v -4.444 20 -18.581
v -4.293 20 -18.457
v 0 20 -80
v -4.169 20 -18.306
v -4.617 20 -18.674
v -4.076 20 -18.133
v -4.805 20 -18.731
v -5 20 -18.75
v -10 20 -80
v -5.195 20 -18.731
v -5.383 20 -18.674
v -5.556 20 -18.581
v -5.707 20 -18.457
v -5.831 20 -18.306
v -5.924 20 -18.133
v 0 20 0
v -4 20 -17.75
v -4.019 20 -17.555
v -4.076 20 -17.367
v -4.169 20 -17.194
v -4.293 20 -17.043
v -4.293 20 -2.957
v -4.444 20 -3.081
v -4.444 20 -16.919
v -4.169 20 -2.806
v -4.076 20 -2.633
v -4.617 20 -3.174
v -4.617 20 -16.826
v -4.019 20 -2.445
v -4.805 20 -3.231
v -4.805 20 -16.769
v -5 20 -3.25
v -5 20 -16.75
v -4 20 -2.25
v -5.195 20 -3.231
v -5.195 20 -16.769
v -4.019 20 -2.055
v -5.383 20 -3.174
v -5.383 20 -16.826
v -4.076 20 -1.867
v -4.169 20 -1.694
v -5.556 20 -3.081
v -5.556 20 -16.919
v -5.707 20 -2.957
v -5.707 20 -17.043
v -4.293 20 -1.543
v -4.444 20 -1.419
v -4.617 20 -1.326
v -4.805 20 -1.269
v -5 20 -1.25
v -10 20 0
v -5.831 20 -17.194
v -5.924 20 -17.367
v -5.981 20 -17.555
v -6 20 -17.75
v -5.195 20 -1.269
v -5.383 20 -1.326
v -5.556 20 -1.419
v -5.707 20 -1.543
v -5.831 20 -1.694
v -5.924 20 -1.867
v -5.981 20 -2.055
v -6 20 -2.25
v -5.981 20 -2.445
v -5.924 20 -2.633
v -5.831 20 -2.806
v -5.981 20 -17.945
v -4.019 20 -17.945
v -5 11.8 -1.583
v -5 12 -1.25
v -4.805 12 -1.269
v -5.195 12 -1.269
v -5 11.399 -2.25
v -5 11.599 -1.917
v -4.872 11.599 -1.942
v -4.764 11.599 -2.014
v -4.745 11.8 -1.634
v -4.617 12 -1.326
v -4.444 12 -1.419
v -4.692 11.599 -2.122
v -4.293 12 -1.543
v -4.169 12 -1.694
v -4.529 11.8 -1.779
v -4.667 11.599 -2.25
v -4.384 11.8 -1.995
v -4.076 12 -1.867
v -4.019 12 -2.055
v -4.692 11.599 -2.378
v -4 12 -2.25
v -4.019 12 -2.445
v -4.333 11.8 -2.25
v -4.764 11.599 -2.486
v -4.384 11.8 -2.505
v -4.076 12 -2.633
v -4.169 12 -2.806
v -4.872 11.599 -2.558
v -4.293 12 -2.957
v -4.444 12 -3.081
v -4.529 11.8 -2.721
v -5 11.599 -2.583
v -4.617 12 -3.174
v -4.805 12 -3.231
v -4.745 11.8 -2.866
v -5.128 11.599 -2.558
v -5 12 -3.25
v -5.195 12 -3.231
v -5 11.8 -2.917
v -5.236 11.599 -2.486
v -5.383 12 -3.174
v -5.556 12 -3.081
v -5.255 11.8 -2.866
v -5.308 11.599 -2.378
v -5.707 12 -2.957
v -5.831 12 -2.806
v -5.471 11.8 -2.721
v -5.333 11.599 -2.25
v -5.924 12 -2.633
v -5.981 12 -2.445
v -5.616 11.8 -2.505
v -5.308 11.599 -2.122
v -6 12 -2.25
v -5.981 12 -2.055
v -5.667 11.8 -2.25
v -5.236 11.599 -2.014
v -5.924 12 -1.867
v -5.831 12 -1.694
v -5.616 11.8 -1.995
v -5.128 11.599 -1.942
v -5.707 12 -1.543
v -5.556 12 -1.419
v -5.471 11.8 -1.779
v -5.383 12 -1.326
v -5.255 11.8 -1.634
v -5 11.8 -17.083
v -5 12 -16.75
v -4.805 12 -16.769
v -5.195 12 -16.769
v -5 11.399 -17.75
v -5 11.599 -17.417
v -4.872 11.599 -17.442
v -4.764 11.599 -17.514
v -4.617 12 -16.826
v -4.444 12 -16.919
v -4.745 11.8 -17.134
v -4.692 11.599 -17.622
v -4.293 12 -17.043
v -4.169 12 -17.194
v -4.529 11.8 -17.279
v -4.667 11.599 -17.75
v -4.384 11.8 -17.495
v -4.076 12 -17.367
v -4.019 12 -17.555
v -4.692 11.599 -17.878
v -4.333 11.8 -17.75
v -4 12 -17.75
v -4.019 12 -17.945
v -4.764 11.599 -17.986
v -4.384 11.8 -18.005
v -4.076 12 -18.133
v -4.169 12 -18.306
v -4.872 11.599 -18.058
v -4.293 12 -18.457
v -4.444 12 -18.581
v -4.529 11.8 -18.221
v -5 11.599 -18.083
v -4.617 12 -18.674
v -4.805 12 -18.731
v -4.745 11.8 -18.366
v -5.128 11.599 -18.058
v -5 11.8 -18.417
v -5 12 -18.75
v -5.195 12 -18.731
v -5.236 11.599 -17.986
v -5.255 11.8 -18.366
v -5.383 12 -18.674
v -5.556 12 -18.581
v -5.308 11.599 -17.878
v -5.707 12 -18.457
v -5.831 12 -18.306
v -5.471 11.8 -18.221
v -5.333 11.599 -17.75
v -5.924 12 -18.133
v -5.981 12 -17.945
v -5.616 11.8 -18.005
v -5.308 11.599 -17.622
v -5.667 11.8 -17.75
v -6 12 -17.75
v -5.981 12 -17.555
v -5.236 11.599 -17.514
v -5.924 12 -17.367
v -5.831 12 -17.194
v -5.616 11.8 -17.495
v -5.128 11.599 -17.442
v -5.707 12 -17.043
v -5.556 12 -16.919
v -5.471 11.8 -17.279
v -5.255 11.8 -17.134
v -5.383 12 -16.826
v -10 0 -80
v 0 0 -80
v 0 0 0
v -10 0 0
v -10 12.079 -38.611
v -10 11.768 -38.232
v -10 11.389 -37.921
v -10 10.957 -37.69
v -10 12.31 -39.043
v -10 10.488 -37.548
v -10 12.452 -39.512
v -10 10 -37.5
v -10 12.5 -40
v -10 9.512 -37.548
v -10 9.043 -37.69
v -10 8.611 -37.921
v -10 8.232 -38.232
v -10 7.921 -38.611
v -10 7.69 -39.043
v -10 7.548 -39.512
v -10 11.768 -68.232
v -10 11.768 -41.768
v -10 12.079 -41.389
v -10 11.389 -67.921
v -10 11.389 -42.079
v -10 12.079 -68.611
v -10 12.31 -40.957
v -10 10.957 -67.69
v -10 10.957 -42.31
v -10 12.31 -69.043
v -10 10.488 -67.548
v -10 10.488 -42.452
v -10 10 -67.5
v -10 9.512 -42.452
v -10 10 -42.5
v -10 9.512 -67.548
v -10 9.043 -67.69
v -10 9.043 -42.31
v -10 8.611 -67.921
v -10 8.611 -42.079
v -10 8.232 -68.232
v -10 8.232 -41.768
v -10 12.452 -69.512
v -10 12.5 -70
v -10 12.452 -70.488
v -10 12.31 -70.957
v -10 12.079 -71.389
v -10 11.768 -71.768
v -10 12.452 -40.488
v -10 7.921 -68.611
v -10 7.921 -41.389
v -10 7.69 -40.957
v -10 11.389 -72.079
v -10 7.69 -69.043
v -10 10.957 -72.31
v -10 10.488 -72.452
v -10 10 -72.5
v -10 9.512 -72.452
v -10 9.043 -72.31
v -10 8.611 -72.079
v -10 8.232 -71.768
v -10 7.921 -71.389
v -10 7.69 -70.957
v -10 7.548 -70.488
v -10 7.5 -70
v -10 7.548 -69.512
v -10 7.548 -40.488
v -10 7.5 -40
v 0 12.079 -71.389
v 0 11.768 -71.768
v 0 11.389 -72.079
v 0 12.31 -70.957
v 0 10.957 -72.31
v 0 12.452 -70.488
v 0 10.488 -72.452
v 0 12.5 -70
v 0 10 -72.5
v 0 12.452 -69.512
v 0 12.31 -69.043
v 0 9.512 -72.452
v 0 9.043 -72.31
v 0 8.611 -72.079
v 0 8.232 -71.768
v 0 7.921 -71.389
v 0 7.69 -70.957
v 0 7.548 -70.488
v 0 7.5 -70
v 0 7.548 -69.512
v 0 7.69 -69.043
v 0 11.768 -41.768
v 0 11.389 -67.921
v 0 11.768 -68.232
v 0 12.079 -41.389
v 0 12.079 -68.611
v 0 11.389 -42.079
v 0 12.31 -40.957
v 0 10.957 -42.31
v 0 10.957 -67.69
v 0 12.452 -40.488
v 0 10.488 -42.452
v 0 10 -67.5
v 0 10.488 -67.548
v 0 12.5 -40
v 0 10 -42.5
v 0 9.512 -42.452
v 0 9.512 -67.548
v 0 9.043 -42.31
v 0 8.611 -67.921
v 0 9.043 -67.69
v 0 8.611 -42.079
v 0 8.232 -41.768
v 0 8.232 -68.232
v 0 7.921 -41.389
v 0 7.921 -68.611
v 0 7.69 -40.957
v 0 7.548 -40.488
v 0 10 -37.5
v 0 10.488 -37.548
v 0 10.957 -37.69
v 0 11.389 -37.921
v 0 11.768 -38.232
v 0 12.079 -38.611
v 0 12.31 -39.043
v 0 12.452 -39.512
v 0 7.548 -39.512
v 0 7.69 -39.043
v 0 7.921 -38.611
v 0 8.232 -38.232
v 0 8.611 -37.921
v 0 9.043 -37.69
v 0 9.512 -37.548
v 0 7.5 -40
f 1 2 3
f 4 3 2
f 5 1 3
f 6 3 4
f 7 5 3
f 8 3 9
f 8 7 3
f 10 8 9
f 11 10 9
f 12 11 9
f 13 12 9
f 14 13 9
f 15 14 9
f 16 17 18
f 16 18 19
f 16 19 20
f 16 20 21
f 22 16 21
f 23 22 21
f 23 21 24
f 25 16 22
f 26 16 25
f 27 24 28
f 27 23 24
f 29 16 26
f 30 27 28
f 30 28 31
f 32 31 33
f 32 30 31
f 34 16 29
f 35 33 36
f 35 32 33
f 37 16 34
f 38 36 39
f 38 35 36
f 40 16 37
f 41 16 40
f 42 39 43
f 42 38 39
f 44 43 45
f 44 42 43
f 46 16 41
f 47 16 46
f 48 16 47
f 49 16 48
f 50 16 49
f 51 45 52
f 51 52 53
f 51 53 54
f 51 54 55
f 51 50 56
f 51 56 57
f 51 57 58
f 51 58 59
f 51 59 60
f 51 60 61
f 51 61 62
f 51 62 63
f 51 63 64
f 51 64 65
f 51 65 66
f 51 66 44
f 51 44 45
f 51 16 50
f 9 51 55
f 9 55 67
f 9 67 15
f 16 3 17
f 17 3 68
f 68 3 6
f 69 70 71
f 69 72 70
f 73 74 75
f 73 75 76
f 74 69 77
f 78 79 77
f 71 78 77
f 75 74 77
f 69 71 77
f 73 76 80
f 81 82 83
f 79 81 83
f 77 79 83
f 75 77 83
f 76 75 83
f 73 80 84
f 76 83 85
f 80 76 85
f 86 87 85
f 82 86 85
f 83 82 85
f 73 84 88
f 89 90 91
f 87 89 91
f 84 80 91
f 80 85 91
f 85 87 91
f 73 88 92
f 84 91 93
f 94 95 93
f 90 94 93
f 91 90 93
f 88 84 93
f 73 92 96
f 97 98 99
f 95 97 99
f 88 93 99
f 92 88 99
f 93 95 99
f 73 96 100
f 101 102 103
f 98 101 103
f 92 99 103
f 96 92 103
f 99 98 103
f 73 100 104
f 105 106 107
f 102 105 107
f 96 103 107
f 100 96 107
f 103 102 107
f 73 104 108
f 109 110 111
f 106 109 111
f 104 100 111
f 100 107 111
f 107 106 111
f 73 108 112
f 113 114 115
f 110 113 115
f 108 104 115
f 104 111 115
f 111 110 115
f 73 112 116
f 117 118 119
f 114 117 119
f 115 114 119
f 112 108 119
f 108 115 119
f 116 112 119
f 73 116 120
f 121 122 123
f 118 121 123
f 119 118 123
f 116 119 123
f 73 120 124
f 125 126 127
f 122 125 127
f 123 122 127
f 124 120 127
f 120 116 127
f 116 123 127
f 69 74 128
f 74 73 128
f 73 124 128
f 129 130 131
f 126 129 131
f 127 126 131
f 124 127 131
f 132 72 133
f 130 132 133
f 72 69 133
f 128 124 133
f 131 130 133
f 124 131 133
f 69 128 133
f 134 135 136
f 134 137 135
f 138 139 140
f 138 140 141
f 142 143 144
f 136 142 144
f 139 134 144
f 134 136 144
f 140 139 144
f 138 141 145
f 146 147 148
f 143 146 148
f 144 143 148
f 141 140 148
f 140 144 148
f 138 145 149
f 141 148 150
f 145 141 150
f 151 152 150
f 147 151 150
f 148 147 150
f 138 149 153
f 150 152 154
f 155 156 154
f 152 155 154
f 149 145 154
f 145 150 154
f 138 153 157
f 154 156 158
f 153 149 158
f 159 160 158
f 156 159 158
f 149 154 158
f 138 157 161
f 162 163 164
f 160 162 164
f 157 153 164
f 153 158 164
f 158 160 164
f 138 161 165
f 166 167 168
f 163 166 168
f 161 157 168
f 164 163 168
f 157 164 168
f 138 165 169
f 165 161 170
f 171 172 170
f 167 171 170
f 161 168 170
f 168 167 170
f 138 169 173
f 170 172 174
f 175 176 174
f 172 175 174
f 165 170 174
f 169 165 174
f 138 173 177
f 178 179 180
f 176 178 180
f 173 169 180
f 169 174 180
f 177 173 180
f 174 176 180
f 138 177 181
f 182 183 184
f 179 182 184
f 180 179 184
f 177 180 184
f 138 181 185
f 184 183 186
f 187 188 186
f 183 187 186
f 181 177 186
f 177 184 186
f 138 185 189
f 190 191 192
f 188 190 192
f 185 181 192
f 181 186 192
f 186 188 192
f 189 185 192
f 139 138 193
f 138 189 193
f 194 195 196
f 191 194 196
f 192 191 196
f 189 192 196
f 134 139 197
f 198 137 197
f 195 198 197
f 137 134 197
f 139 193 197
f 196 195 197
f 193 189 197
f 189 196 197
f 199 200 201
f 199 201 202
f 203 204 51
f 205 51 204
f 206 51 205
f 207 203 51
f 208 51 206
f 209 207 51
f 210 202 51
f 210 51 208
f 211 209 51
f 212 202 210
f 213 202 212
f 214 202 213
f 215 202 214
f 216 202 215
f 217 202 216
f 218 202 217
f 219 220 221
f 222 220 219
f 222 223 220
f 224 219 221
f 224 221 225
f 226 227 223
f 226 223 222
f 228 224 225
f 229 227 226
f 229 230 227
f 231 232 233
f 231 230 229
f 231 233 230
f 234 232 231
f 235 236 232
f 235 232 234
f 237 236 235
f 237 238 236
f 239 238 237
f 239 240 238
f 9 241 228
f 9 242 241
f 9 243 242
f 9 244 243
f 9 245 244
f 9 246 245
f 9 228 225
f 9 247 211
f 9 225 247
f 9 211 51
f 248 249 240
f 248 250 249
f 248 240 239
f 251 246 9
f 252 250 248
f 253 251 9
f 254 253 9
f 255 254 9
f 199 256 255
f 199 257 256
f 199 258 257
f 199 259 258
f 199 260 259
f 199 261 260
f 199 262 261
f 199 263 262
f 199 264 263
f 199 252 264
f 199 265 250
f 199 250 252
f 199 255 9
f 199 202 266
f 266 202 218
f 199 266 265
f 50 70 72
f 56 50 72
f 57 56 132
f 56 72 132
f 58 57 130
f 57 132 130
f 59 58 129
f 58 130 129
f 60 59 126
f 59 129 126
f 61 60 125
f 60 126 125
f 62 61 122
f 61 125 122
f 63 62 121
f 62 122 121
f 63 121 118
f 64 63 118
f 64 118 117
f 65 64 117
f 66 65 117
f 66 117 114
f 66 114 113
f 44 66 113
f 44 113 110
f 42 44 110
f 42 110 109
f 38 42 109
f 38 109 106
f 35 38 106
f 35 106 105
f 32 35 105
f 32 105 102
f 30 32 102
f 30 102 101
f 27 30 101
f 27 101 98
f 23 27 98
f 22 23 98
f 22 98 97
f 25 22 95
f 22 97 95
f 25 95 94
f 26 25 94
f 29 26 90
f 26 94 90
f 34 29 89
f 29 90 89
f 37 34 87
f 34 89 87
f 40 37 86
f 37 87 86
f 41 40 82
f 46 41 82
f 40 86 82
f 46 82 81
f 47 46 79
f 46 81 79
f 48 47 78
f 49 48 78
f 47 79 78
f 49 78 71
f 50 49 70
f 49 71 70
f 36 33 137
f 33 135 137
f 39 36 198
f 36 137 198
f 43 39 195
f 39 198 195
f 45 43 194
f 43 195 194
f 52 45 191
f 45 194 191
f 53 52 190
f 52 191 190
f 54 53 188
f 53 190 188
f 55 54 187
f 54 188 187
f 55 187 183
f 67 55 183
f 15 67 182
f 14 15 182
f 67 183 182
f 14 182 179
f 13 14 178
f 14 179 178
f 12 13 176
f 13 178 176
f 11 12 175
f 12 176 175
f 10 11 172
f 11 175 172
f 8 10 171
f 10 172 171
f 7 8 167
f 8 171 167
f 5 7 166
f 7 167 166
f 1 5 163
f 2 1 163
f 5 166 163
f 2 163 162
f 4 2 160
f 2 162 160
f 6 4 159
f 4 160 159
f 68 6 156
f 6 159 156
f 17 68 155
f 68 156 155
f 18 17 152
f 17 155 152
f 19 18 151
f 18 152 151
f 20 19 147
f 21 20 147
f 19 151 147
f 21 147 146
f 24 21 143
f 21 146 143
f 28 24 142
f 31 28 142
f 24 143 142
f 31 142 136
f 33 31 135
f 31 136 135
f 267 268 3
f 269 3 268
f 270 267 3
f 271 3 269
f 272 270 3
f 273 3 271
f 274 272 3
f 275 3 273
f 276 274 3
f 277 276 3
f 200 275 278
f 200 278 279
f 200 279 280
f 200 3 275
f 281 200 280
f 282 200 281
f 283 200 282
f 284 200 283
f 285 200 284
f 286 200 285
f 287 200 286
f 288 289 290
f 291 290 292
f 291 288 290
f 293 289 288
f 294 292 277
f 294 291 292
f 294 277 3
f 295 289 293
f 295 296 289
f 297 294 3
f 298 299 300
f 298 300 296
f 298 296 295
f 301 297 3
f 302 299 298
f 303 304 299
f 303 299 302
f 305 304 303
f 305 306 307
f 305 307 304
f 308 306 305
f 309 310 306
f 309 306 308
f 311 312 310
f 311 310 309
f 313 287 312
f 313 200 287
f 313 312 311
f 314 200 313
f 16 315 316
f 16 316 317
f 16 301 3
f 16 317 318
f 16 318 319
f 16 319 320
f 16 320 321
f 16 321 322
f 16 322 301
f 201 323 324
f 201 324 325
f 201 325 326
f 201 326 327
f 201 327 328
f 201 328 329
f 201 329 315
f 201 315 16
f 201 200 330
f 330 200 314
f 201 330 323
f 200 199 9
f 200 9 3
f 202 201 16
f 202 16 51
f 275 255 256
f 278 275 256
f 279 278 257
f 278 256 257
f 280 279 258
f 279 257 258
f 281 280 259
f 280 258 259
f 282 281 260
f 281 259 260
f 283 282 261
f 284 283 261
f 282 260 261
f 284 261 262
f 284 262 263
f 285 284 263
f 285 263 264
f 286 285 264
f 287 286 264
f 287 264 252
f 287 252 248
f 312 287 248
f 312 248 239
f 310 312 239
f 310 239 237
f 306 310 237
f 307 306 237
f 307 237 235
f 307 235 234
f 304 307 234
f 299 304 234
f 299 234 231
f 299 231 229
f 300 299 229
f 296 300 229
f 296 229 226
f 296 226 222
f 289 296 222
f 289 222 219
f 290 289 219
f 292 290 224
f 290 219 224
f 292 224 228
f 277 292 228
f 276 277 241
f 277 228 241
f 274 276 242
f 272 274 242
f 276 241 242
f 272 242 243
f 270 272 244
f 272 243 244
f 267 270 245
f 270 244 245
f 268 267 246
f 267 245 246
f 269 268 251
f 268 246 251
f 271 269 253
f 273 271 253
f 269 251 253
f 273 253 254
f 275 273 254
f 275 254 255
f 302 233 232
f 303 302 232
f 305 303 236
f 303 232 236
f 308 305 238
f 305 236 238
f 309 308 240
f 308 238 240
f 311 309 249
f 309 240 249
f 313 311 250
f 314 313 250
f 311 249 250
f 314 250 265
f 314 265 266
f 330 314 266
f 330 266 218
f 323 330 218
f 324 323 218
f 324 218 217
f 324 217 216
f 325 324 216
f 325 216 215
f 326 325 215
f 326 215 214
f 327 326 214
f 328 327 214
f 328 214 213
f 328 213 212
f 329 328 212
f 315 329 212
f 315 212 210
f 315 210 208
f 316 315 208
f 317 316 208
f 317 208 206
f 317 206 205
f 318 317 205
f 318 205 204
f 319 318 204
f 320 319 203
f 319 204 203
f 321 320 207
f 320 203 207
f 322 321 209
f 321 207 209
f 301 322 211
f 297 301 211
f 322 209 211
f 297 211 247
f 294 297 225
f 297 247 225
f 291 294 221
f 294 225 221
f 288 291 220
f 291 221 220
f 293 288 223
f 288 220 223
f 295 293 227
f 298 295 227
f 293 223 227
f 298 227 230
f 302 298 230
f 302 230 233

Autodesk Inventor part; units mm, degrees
ref_plane "YZ Plane" through (0, 0, 0) normal (1, 0, 0) x (0, 1, 0)
ref_plane "XZ Plane" through (0, 0, 0) normal (0, 1, 0) x (-1, 0, 0)
ref_plane "XY Plane" through (0, 0, 0) normal (0, 0, 1) x (1, 0, 0)
sketch "Skizze1" plane through (0, 0, 0) normal (0, 1, 0) x (-1, 0, 0)
  line L0 (0, 0) -> (10, 0)
  line L1 (10, 0) -> (10, -80)
  line L2 (10, -80) -> (0, -80)
  line L3 (0, -80) -> (0, 0)
  dimension "d0" = 10
  dimension "d1" = 80
extrude "Extrusion1" add sketch "Skizze1" along normal blind 20
sketch "Skizze2" plane through (0, 20, 0) normal (0, 1, 0) x (1, 0, 0)
  line L0 (0, 0) -> (-5, 0)
  line L1 (-10, 0) -> (0, 0) projected
  line L2 (-5, 0) -> (-5, 2.25)
  line L3 (-5, 2.25) -> (-5, 17.75)
  dimension "d4" = 2.25
  dimension "d5" = 15.5
hole "Bohrung1" at (-5, 20, -2.25) at (-5, 20, -17.75) direction (0, -1, 0) diameter 2 depth 8 tip angle 118
sketch "Skizze3" plane through (0, 0, 0) normal (1, 0, 0) x (0, 0, -1)
  line L0 (80, 0) -> (0, 0) projected
  line L1 (80, 0) -> (80, 10)
  line L2 (80, 0) -> (80, 20) projected
  line L3 (80, 10) -> (30, 10)
  line L4 (30, 10) -> (40, 10)
  line L5 (40, 10) -> (70, 10)
  dimension "d13" = 50
  dimension "d14" = 10
  dimension "d15" = 30
hole "Bohrung2" at (0, 10, -40) at (0, 10, -70) direction (-1, 0, 0) diameter 5 end through all
properties part number "Sensor_Halterung_Teil1" material "Holz (Eiche)"
